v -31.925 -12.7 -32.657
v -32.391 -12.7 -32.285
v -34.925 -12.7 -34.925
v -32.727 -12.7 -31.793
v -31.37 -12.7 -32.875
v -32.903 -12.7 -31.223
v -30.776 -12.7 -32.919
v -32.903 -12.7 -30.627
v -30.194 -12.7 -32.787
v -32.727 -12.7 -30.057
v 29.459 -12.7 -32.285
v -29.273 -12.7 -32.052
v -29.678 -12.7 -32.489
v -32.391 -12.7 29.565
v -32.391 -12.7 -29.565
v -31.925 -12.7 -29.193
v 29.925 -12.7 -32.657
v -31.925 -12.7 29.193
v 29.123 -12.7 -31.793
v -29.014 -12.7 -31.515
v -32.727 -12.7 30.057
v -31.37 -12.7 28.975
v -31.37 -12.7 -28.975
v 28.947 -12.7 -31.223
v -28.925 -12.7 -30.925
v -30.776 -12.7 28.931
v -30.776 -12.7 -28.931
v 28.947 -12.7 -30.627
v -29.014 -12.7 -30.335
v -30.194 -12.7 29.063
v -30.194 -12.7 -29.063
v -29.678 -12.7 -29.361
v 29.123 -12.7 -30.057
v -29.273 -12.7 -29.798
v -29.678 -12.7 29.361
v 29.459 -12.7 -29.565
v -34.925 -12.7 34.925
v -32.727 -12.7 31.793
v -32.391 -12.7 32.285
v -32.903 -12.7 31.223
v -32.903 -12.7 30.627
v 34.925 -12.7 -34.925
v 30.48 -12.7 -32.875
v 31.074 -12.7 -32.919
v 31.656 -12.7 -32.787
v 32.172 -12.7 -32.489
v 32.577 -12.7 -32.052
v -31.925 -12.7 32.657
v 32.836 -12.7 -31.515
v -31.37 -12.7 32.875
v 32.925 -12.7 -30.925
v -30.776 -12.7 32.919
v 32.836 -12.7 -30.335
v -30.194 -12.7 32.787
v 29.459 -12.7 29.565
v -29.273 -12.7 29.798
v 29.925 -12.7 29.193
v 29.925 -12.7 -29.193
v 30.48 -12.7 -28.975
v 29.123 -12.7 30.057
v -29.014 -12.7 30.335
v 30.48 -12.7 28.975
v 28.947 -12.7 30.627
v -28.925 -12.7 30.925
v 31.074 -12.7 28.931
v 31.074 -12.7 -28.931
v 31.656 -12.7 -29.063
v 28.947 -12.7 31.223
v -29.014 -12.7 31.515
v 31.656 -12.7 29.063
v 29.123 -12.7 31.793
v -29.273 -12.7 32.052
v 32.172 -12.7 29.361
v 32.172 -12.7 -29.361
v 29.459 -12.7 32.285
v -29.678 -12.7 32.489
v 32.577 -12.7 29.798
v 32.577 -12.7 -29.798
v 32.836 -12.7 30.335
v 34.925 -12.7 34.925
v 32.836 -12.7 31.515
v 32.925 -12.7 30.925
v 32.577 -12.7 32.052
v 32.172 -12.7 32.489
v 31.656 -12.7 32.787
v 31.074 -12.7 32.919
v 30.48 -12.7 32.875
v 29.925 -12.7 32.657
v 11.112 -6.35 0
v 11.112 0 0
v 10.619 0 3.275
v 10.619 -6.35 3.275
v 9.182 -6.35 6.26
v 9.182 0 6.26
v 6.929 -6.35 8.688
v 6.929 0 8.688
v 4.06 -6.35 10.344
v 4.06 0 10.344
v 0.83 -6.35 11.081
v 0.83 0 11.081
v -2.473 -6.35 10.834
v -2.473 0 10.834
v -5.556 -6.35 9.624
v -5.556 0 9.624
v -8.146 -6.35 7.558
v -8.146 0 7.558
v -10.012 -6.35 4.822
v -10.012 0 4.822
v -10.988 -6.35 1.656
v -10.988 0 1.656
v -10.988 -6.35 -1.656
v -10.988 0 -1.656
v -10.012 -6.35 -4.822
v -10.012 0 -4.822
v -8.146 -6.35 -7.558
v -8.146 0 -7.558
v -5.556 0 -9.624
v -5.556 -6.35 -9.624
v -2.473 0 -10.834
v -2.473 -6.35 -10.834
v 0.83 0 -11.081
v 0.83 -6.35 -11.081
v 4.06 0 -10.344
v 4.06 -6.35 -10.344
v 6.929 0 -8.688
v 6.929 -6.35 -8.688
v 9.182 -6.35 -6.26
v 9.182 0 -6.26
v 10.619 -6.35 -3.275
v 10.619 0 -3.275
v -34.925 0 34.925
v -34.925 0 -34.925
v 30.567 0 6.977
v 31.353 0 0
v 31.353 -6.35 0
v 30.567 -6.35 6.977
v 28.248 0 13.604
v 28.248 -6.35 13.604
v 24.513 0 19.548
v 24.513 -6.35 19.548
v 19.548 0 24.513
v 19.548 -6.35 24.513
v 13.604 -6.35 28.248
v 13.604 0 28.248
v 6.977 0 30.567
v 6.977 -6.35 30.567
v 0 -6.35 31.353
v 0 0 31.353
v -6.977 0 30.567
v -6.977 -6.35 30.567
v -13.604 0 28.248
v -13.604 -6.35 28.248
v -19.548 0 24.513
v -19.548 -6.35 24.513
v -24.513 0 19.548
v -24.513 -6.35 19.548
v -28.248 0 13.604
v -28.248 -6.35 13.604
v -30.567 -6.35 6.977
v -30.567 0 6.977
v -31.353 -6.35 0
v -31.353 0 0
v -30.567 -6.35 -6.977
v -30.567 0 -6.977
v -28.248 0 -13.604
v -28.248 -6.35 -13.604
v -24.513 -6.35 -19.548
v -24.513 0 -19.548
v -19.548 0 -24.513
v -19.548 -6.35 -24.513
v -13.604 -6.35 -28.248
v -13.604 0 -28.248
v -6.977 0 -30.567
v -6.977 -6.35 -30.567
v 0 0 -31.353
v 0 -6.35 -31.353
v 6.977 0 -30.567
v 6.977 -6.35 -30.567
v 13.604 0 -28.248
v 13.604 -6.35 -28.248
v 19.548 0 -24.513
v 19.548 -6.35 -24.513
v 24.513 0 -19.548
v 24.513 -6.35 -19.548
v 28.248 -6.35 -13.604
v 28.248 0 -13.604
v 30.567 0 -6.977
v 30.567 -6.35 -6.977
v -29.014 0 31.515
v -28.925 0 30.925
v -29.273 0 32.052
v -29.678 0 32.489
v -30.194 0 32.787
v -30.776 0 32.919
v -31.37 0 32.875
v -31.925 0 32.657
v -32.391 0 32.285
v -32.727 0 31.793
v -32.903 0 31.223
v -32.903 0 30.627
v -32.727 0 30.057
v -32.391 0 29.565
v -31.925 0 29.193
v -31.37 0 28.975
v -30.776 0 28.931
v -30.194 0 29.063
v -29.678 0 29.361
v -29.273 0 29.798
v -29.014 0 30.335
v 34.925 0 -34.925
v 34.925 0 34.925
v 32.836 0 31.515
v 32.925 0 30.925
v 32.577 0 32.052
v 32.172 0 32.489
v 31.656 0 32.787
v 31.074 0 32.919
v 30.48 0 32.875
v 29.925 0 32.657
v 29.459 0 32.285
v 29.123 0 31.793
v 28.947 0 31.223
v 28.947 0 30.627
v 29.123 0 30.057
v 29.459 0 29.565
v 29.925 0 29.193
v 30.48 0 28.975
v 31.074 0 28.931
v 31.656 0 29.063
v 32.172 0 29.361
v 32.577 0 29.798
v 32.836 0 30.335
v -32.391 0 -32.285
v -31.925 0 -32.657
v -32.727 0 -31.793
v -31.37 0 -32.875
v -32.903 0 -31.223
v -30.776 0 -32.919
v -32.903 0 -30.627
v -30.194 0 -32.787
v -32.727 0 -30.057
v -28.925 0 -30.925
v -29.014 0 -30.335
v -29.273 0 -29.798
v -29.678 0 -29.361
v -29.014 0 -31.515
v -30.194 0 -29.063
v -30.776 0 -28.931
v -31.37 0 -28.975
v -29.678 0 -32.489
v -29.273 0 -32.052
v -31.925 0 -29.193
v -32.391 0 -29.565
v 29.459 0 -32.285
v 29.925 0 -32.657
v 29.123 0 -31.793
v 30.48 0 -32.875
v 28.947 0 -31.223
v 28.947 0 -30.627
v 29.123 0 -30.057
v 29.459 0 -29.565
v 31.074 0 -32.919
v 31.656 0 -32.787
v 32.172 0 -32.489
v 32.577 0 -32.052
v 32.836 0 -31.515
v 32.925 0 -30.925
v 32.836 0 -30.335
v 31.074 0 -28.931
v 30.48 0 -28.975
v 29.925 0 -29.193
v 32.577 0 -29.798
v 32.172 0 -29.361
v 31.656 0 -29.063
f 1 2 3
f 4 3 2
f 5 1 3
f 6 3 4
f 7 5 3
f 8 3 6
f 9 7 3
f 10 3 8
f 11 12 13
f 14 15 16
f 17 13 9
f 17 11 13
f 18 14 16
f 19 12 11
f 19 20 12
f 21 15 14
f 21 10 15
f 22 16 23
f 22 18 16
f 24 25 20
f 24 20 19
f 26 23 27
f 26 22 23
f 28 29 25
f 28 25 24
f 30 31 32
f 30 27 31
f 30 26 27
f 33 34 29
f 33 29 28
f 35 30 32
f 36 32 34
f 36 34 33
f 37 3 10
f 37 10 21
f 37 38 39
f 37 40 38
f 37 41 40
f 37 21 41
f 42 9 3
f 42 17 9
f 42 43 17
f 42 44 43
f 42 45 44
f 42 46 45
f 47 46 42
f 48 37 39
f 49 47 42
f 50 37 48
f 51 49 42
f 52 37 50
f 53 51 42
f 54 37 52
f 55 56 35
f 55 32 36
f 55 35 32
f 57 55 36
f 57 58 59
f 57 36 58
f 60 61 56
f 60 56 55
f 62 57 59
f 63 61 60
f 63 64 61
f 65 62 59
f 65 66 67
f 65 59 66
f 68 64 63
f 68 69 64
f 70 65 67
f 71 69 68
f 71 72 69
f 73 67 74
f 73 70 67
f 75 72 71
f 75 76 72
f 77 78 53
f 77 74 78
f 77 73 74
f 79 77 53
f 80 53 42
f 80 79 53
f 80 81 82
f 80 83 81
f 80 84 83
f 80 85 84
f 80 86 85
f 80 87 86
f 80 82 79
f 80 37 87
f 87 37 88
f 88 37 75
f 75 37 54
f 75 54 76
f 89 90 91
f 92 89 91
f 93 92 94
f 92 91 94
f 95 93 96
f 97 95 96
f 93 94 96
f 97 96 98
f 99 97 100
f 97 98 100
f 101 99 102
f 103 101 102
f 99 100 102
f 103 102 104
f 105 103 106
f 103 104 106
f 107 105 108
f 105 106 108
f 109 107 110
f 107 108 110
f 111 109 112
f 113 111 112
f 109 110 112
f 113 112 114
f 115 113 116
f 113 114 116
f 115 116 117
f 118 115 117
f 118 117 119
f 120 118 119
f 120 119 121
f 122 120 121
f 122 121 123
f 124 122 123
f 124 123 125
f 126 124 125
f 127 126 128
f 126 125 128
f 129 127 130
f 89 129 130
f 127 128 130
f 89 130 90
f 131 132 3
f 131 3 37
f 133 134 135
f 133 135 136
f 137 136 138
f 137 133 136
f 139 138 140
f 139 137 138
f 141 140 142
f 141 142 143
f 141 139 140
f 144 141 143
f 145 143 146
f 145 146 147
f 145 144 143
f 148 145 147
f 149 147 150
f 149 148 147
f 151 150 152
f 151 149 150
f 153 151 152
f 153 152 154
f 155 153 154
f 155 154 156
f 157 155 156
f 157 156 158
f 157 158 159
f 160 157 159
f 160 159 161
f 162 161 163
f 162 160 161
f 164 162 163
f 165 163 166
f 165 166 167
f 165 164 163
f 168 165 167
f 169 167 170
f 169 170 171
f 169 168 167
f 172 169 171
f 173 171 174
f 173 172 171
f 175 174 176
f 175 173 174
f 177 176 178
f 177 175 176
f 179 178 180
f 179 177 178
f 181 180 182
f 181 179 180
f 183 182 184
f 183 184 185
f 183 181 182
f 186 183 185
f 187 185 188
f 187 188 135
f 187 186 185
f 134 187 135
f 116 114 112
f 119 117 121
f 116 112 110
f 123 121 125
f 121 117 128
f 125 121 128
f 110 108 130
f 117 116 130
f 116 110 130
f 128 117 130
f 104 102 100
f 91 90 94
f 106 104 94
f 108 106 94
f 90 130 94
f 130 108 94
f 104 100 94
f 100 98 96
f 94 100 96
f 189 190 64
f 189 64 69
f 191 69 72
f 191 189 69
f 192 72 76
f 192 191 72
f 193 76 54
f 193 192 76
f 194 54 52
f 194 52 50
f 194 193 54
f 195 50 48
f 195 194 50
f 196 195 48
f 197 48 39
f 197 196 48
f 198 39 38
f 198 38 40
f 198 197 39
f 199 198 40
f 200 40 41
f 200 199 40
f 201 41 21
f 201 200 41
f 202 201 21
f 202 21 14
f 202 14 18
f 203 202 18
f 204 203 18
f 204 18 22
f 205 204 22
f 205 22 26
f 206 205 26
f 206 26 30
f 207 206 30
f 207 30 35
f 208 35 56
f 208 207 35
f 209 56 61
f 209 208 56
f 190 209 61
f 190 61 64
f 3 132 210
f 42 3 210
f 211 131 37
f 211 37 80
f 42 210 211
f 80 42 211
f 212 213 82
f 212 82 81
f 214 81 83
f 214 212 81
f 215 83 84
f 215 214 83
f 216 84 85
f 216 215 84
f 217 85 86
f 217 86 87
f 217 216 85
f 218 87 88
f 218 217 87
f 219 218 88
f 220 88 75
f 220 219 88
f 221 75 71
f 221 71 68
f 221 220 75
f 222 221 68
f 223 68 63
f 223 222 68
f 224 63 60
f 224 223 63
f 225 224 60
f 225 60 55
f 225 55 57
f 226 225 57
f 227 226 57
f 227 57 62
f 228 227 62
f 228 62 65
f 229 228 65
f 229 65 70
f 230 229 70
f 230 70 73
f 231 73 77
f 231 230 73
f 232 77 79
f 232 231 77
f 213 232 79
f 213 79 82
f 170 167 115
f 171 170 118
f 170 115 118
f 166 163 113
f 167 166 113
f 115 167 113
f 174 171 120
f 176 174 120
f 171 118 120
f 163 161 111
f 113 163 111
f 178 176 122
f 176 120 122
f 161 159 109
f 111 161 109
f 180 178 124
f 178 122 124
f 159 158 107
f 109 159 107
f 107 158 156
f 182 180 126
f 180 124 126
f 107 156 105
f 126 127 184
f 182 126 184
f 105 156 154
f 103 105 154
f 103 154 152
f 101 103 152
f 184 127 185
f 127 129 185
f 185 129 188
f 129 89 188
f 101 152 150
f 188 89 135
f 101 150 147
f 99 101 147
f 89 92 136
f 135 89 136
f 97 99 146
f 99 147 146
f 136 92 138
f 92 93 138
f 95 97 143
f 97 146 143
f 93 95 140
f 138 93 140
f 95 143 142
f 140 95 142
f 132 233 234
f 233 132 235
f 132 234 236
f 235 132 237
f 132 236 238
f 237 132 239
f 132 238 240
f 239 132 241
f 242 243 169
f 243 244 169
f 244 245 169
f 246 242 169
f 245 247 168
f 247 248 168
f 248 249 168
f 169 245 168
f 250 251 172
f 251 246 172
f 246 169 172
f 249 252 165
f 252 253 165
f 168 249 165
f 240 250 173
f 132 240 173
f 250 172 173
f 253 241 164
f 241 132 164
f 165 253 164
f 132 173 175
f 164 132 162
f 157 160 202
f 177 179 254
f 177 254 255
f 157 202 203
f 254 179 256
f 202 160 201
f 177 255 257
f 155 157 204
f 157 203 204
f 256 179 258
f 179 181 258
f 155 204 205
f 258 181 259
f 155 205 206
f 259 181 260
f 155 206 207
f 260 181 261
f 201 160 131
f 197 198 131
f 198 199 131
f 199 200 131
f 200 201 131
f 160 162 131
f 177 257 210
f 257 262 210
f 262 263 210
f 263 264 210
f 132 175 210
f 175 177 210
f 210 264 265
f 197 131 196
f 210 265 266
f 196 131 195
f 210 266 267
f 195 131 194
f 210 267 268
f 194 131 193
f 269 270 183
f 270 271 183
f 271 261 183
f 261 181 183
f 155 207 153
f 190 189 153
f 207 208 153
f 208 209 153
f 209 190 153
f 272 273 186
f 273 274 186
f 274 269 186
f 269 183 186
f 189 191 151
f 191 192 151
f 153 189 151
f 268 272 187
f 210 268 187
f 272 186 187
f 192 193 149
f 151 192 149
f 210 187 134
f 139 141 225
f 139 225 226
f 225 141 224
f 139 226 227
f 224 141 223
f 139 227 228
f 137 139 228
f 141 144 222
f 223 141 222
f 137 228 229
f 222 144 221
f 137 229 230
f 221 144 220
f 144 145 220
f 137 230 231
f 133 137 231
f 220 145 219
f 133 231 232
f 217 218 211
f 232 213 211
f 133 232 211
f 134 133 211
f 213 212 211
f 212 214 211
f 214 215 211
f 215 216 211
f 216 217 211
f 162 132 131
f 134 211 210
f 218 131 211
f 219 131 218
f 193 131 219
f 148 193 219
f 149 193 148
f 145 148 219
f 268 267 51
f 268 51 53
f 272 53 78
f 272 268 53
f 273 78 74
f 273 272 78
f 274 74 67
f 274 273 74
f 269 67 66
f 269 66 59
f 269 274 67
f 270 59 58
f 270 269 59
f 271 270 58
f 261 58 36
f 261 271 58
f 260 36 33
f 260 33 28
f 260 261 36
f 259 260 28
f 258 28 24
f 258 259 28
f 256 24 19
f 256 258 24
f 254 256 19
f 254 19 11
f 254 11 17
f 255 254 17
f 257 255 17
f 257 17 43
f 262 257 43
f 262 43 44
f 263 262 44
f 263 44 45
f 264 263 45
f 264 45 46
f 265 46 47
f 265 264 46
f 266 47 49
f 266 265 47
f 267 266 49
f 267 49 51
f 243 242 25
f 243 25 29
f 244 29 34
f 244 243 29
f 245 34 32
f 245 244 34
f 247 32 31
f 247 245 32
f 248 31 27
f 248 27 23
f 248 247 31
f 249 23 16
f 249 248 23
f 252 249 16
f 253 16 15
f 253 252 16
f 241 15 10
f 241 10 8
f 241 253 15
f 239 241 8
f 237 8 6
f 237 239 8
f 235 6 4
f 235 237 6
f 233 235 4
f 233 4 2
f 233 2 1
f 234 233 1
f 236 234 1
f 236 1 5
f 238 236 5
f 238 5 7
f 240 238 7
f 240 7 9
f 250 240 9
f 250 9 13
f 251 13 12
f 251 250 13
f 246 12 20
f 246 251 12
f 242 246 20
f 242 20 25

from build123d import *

# Parameters (mm, degrees)
F0_W     = 69.85
F0_H     = 69.85
F0_R     = 2
F3_DEPTH = 12.7
F1_R     = 31.353125
F4_DEPTH = 6.35
F2_R     = 11.1125
F5_DEPTH = 6.35


with BuildPart() as f3:
    # F0 (on Front) → F3 (new body)
    with BuildSketch(Plane.XZ):
        Rectangle(F0_W, F0_H)
        with Locations((-30.925, -30.925)):
            Circle(F0_R, mode=Mode.SUBTRACT)
        with Locations((30.925, -30.925)):
            Circle(F0_R, mode=Mode.SUBTRACT)
        with Locations((-30.925, 30.925)):
            Circle(F0_R, mode=Mode.SUBTRACT)
        with Locations((30.925, 30.925)):
            Circle(F0_R, mode=Mode.SUBTRACT)
    extrude(amount=F3_DEPTH)

    # F1 (on Front) → F4 (cut)
    with BuildSketch(Plane.XZ):
        Circle(F1_R)
    extrude(amount=F4_DEPTH, mode=Mode.SUBTRACT)

    # F2 (on Front) → F5 (join)
    with BuildSketch(Plane.XZ):
        Circle(F2_R)
    extrude(amount=F5_DEPTH)


solid = f3.part
